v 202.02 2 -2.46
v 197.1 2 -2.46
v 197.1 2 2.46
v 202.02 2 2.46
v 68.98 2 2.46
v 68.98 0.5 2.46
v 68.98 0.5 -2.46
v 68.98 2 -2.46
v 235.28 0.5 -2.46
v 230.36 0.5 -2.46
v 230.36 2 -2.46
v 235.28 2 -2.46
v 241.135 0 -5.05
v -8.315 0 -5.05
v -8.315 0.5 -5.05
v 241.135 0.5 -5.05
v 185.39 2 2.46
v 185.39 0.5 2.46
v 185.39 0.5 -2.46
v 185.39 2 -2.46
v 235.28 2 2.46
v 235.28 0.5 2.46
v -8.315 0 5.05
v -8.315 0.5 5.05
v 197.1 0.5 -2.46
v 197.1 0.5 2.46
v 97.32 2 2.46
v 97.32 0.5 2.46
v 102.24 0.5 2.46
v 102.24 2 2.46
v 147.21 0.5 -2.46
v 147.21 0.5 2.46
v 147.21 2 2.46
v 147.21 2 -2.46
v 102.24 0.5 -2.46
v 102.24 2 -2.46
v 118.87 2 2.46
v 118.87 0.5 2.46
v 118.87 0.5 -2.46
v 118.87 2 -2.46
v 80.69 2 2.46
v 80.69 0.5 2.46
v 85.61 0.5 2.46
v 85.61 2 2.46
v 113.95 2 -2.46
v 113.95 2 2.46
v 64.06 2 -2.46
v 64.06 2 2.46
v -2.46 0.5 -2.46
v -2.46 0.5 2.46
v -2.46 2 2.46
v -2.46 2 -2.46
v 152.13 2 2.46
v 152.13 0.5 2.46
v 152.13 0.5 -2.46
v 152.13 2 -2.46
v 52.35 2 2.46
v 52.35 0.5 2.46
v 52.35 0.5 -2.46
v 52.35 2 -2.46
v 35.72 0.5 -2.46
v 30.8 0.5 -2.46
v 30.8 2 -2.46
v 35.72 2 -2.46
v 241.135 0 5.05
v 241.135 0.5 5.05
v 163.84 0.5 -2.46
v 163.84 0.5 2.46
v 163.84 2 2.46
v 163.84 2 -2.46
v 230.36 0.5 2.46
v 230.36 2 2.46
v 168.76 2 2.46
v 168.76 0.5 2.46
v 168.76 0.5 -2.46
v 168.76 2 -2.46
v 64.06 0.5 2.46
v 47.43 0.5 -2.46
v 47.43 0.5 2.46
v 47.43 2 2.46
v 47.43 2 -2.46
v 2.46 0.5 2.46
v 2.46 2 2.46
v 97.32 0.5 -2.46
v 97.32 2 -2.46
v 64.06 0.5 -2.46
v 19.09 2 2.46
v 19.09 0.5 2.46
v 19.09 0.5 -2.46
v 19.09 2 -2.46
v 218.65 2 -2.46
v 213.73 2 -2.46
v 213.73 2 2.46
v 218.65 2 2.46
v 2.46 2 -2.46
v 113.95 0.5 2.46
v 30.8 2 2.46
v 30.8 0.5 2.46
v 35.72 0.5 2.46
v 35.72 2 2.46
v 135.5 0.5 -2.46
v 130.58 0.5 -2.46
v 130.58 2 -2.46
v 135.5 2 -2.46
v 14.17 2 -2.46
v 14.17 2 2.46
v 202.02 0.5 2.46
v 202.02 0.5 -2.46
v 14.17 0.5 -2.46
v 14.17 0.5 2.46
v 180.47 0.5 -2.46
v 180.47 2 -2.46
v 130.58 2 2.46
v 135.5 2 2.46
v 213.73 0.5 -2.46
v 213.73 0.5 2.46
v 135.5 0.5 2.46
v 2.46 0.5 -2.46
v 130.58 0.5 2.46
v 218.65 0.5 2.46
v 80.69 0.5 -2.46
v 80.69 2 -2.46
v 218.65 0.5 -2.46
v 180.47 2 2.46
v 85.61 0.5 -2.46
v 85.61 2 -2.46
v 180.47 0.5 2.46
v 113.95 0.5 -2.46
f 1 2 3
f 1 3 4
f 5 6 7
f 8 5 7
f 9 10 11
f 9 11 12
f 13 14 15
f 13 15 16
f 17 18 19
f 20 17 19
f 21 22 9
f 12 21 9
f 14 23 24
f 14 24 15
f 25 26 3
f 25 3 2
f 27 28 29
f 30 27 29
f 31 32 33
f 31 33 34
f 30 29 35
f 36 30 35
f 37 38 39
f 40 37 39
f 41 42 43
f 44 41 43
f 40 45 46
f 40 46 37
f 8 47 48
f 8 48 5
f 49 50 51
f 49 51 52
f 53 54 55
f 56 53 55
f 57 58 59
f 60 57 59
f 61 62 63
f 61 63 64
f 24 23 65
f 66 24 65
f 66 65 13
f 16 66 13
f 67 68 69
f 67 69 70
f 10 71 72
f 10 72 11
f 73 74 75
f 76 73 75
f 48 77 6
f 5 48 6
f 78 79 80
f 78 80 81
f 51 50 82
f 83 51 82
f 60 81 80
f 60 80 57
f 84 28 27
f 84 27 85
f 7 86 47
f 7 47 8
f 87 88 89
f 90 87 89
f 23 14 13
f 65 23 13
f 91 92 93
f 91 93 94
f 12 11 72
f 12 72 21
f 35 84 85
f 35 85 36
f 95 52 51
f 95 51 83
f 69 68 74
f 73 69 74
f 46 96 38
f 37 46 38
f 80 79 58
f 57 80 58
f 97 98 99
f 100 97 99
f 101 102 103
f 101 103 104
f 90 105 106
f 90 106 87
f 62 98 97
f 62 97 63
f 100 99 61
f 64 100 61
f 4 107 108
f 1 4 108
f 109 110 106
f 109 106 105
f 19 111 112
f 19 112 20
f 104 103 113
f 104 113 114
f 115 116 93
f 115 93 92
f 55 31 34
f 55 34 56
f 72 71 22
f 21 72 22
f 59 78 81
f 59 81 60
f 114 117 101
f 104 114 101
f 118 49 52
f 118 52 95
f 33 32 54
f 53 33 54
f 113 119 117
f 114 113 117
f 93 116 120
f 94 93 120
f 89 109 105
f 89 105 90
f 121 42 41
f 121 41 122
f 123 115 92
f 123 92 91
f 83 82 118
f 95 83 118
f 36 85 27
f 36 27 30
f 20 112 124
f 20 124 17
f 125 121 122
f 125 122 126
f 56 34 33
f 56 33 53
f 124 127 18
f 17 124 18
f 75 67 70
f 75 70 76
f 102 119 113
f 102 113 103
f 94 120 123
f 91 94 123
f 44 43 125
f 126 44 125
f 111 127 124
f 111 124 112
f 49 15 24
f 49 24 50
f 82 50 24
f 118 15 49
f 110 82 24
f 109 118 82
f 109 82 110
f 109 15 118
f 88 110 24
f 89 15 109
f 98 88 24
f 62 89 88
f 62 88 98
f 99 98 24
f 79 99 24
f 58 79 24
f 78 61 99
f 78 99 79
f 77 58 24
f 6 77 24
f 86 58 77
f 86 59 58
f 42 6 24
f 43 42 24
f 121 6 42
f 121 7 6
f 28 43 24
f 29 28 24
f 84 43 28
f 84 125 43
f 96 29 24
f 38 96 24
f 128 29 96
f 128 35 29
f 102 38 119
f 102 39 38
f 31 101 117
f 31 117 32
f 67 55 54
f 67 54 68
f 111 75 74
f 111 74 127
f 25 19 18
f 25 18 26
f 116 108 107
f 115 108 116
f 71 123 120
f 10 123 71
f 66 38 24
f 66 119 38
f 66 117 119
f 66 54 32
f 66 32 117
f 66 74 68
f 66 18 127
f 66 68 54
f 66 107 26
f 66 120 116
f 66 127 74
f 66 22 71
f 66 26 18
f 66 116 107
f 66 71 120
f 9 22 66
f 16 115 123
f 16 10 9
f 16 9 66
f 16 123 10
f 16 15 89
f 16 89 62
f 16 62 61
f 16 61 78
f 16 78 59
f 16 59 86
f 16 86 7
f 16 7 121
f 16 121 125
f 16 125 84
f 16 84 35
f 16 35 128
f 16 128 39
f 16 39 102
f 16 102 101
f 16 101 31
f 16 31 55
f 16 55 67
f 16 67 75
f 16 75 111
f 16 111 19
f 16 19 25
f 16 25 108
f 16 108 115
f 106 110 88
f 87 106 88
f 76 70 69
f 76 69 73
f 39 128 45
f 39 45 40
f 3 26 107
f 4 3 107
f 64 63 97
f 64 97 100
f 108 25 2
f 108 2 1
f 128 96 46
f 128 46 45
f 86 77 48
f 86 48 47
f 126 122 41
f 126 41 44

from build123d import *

# Parameters (mm, degrees)
SKETCH1_W           = 4.92
SKETCH1_H           = 4.92
BOSS_EXTRUDE1_DEPTH = 2
LPATTERN1_COUNT     = 15
LPATTERN1_PITCH     = 16.63
SKETCH2_W           = 249.45
SKETCH2_H           = 10.1
BOSS_EXTRUDE2_DEPTH = 0.5


with BuildPart() as part:
    # Sketch1 → Boss-Extrude1 (new body)
    with BuildSketch(Plane(origin=(0, 0, 0), x_dir=(1, 0, 0), z_dir=(0, 1, 0))):
        Rectangle(SKETCH1_W, SKETCH1_H)
    extrude(amount=BOSS_EXTRUDE1_DEPTH)


with BuildPart() as lpattern1_1:
    # LPattern1: pattern copy
    add(part.part.moved(Location(Vector(1, 0, 0) * (1 * LPATTERN1_PITCH))))


with BuildPart() as lpattern1_2:
    # LPattern1: pattern copy
    add(part.part.moved(Location(Vector(1, 0, 0) * (2 * LPATTERN1_PITCH))))


with BuildPart() as lpattern1_3:
    # LPattern1: pattern copy
    add(part.part.moved(Location(Vector(1, 0, 0) * (3 * LPATTERN1_PITCH))))


with BuildPart() as lpattern1_4:
    # LPattern1: pattern copy
    add(part.part.moved(Location(Vector(1, 0, 0) * (4 * LPATTERN1_PITCH))))


with BuildPart() as lpattern1_5:
    # LPattern1: pattern copy
    add(part.part.moved(Location(Vector(1, 0, 0) * (5 * LPATTERN1_PITCH))))


with BuildPart() as lpattern1_6:
    # LPattern1: pattern copy
    add(part.part.moved(Location(Vector(1, 0, 0) * (6 * LPATTERN1_PITCH))))


with BuildPart() as lpattern1_7:
    # LPattern1: pattern copy
    add(part.part.moved(Location(Vector(1, 0, 0) * (7 * LPATTERN1_PITCH))))


with BuildPart() as lpattern1_8:
    # LPattern1: pattern copy
    add(part.part.moved(Location(Vector(1, 0, 0) * (8 * LPATTERN1_PITCH))))


with BuildPart() as lpattern1_9:
    # LPattern1: pattern copy
    add(part.part.moved(Location(Vector(1, 0, 0) * (9 * LPATTERN1_PITCH))))


with BuildPart() as lpattern1_10:
    # LPattern1: pattern copy
    add(part.part.moved(Location(Vector(1, 0, 0) * (10 * LPATTERN1_PITCH))))


with BuildPart() as lpattern1_11:
    # LPattern1: pattern copy
    add(part.part.moved(Location(Vector(1, 0, 0) * (11 * LPATTERN1_PITCH))))


with BuildPart() as lpattern1_12:
    # LPattern1: pattern copy
    add(part.part.moved(Location(Vector(1, 0, 0) * (12 * LPATTERN1_PITCH))))


with BuildPart() as lpattern1_13:
    # LPattern1: pattern copy
    add(part.part.moved(Location(Vector(1, 0, 0) * (13 * LPATTERN1_PITCH))))


with BuildPart() as lpattern1_14:
    # LPattern1: pattern copy
    add(part.part.moved(Location(Vector(1, 0, 0) * (14 * LPATTERN1_PITCH))))


with BuildPart() as part_1:
    add(part.part)

    add(lpattern1_1.part)  # Boss-Extrude2 merges LPattern1_1

    add(lpattern1_2.part)  # Boss-Extrude2 merges LPattern1_2

    add(lpattern1_3.part)  # Boss-Extrude2 merges LPattern1_3

    add(lpattern1_4.part)  # Boss-Extrude2 merges LPattern1_4

    add(lpattern1_5.part)  # Boss-Extrude2 merges LPattern1_5

    add(lpattern1_6.part)  # Boss-Extrude2 merges LPattern1_6

    add(lpattern1_7.part)  # Boss-Extrude2 merges LPattern1_7

    add(lpattern1_8.part)  # Boss-Extrude2 merges LPattern1_8

    add(lpattern1_9.part)  # Boss-Extrude2 merges LPattern1_9

    add(lpattern1_10.part)  # Boss-Extrude2 merges LPattern1_10

    add(lpattern1_11.part)  # Boss-Extrude2 merges LPattern1_11

    add(lpattern1_12.part)  # Boss-Extrude2 merges LPattern1_12

    add(lpattern1_13.part)  # Boss-Extrude2 merges LPattern1_13

    add(lpattern1_14.part)  # Boss-Extrude2 merges LPattern1_14
    # Sketch2 → Boss-Extrude2 (add)
    with BuildSketch(Plane(origin=(0, 0, 0), x_dir=(1, 0, 0), z_dir=(0, 1, 0))):
        with Locations((116.41, 0)):
            Rectangle(SKETCH2_W, SKETCH2_H)
    extrude(amount=BOSS_EXTRUDE2_DEPTH)


solid = part_1.part
